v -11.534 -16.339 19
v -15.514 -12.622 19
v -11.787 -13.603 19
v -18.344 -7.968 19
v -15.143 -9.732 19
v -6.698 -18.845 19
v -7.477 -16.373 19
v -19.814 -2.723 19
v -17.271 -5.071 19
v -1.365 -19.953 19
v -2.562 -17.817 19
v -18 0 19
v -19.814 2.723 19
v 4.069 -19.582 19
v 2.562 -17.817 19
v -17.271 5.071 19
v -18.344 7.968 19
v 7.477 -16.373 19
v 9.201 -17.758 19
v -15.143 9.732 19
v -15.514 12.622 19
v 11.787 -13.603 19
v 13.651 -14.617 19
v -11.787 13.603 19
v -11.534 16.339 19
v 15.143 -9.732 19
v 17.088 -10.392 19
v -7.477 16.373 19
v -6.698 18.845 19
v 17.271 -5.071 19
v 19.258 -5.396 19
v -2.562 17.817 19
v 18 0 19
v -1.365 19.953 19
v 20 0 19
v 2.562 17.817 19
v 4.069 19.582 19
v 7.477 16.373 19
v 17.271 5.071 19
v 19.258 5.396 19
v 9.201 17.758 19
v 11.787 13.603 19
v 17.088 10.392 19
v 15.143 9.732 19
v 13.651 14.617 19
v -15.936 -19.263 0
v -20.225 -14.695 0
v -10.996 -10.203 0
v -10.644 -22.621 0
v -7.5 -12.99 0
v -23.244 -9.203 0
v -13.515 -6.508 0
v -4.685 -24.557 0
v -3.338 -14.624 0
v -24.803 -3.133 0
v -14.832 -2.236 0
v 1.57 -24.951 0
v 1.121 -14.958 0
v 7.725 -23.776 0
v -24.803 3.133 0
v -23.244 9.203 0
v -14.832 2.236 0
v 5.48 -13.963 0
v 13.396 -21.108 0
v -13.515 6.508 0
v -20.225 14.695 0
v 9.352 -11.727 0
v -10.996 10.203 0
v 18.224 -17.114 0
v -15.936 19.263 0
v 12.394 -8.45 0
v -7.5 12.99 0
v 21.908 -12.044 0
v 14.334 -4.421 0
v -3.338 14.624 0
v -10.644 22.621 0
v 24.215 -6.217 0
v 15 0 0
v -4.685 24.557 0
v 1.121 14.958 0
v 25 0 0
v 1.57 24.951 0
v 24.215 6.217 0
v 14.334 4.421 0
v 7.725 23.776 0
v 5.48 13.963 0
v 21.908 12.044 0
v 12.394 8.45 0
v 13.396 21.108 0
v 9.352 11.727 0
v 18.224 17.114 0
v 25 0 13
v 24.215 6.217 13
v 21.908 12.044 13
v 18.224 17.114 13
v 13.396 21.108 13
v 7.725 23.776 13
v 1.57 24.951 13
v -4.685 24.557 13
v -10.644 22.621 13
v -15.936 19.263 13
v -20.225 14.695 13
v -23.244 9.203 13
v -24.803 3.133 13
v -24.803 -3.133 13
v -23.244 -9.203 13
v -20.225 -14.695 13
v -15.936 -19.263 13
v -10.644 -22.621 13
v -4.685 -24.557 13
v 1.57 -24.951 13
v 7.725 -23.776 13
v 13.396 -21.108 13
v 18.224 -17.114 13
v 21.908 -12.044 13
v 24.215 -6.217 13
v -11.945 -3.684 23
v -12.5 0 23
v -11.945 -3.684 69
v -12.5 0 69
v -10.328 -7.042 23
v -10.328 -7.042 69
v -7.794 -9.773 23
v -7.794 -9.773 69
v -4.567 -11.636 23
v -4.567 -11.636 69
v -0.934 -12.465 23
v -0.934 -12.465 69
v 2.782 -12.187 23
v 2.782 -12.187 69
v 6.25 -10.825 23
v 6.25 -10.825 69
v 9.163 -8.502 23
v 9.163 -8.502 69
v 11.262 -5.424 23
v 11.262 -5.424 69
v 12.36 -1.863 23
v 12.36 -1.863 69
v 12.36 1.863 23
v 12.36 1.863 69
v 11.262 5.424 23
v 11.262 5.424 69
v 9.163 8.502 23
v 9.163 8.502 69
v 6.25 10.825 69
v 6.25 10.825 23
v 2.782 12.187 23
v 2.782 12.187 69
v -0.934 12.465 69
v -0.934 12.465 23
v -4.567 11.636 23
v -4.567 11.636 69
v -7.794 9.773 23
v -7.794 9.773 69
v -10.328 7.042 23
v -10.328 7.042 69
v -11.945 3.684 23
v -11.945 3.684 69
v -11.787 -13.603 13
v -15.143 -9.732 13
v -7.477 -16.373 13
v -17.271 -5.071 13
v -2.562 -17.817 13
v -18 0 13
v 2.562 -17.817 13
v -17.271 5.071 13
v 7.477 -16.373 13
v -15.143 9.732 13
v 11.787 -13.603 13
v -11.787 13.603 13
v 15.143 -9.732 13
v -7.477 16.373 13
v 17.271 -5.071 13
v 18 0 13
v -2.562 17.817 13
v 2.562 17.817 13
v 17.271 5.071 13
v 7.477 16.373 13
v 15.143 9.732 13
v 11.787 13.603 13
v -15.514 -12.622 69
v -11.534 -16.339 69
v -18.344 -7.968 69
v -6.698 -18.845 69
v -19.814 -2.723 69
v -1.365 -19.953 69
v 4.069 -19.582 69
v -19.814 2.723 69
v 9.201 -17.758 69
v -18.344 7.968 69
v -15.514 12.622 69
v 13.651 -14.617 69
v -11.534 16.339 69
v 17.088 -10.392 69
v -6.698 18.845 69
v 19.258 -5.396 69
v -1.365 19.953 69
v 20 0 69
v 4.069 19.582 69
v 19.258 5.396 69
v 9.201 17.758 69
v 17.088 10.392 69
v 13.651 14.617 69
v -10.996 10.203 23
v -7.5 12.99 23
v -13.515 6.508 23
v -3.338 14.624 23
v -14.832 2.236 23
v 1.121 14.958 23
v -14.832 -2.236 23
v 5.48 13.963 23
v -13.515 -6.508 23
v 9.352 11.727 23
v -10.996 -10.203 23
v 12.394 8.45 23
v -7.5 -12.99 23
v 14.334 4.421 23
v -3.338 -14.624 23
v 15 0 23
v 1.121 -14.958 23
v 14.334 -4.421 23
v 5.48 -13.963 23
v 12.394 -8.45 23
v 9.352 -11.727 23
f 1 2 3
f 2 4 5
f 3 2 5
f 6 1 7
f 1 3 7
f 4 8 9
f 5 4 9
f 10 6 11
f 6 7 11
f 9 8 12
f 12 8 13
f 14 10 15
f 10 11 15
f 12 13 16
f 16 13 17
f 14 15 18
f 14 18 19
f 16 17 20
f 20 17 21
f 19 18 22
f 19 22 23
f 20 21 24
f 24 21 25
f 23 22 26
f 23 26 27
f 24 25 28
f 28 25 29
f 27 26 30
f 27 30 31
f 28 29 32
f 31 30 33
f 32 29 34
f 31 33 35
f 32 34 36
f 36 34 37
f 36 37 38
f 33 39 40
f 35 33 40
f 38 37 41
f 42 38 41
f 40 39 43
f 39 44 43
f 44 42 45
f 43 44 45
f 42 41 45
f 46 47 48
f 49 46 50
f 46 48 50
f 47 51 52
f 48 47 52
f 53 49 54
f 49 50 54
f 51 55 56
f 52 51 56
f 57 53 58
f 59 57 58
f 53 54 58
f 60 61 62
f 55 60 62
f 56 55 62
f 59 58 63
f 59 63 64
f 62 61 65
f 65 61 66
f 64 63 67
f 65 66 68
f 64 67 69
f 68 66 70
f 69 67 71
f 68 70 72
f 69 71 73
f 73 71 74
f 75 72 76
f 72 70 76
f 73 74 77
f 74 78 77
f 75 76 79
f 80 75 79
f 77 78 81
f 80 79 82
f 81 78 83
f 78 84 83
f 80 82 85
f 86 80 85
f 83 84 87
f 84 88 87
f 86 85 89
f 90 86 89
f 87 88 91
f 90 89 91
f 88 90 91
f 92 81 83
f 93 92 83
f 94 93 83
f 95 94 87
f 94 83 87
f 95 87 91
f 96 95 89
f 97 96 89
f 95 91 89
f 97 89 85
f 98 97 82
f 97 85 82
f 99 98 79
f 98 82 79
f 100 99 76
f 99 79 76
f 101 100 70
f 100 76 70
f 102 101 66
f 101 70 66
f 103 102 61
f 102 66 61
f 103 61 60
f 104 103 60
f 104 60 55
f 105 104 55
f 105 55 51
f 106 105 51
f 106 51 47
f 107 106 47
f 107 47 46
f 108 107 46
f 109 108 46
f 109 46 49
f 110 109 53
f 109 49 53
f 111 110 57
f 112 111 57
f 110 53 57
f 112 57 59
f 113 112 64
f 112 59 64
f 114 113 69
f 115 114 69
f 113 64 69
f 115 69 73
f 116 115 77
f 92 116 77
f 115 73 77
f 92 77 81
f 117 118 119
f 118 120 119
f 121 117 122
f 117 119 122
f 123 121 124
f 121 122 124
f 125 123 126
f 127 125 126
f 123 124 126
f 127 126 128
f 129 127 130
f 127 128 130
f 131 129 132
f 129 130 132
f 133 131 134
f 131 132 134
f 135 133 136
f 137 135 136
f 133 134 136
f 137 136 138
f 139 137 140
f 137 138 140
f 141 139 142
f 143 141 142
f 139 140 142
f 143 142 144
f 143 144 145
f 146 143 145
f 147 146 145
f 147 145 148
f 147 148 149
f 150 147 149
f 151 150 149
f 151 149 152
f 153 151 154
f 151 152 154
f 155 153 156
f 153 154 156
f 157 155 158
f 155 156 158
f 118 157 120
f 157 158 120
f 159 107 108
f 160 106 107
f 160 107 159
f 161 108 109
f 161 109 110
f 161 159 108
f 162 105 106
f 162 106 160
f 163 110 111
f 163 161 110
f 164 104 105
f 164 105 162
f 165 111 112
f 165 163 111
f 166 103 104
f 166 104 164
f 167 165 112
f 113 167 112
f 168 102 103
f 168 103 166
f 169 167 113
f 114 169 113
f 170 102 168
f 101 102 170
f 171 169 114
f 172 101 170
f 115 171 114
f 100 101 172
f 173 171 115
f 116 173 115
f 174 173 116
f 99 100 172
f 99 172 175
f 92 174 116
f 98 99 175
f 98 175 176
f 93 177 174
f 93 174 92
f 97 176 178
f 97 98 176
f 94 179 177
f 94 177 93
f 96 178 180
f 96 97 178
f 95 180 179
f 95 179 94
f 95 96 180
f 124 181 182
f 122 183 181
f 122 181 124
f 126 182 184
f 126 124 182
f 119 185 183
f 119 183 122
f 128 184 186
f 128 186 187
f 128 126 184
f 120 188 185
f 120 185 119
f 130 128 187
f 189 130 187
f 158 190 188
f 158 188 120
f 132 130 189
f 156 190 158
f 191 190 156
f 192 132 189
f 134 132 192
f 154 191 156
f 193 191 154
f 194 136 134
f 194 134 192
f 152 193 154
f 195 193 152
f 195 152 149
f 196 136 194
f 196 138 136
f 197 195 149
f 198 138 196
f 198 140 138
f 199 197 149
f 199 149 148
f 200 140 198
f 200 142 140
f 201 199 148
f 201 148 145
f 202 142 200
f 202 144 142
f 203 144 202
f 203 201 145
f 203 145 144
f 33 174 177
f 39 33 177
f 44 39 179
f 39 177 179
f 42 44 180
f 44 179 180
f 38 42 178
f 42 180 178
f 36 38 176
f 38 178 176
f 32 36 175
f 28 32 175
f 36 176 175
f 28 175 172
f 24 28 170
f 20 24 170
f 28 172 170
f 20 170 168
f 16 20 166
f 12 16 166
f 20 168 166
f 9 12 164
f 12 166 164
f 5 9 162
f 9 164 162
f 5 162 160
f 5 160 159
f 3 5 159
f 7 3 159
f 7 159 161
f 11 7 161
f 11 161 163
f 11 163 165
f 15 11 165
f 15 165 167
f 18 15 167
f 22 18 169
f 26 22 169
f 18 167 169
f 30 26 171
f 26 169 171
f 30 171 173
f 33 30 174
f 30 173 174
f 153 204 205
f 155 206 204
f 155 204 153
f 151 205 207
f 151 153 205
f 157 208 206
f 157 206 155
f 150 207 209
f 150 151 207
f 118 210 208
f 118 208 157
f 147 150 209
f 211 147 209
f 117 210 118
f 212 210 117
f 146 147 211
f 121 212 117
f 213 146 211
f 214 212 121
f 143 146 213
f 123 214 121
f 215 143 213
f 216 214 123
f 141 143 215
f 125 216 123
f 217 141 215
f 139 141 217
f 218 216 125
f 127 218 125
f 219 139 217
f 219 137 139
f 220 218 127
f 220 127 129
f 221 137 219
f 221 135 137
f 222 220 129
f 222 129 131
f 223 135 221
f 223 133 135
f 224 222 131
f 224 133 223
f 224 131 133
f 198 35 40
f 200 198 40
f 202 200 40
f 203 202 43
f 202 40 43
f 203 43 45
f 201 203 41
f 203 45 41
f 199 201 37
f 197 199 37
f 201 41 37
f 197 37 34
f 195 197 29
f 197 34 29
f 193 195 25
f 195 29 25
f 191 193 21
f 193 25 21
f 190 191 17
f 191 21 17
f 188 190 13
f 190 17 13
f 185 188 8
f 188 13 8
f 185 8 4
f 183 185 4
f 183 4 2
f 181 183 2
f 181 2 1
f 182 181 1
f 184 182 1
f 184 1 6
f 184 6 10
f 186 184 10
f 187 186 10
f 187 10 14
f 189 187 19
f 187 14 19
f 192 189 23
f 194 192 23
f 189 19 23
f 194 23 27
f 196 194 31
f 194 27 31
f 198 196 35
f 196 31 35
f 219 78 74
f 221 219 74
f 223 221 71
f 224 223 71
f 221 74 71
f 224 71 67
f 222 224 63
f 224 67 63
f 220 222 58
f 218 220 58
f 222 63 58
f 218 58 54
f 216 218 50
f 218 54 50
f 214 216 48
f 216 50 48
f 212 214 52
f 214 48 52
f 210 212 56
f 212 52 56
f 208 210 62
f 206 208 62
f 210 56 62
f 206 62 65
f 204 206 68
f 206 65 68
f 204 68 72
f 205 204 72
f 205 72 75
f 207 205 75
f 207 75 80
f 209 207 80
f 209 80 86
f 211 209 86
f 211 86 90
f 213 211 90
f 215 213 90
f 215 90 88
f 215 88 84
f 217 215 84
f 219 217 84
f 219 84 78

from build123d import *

# Parameters (mm, degrees)
F0_R           = 25
F1_DEPTH       = 13
F2_R           = 18
F3_DEPTH       = 6
F4_R           = 20
F4_R_2         = 18
F5_DEPTH       = 50
F7_D           = 25
F7_CBORE_D     = 30
F7_CBORE_DEPTH = 23


with BuildPart() as f1:
    # F0 (on Top) → F1 (new body)
    with BuildSketch(Plane.XY):
        Circle(F0_R)
    extrude(amount=F1_DEPTH)

    # F2 (on face) → F3 (join)
    with BuildSketch(Plane.XY.offset(13)):
        Circle(F2_R)
    extrude(amount=F3_DEPTH)

    # F4 (on face) → F5 (join)
    with BuildSketch(Plane.XY.offset(19)):
        Circle(F4_R)
        Circle(F4_R_2, mode=Mode.SUBTRACT)
        Circle(F4_R_2)
    extrude(amount=F5_DEPTH)

    # F7 (through all)
    with Locations(Plane(origin=(0, 0, 0), x_dir=(1, 0, 0), z_dir=(0, 0, -1))):
        with Locations((0, 0)):
            CounterBoreHole(F7_D / 2, F7_CBORE_D / 2, F7_CBORE_DEPTH)


solid = f1.part
